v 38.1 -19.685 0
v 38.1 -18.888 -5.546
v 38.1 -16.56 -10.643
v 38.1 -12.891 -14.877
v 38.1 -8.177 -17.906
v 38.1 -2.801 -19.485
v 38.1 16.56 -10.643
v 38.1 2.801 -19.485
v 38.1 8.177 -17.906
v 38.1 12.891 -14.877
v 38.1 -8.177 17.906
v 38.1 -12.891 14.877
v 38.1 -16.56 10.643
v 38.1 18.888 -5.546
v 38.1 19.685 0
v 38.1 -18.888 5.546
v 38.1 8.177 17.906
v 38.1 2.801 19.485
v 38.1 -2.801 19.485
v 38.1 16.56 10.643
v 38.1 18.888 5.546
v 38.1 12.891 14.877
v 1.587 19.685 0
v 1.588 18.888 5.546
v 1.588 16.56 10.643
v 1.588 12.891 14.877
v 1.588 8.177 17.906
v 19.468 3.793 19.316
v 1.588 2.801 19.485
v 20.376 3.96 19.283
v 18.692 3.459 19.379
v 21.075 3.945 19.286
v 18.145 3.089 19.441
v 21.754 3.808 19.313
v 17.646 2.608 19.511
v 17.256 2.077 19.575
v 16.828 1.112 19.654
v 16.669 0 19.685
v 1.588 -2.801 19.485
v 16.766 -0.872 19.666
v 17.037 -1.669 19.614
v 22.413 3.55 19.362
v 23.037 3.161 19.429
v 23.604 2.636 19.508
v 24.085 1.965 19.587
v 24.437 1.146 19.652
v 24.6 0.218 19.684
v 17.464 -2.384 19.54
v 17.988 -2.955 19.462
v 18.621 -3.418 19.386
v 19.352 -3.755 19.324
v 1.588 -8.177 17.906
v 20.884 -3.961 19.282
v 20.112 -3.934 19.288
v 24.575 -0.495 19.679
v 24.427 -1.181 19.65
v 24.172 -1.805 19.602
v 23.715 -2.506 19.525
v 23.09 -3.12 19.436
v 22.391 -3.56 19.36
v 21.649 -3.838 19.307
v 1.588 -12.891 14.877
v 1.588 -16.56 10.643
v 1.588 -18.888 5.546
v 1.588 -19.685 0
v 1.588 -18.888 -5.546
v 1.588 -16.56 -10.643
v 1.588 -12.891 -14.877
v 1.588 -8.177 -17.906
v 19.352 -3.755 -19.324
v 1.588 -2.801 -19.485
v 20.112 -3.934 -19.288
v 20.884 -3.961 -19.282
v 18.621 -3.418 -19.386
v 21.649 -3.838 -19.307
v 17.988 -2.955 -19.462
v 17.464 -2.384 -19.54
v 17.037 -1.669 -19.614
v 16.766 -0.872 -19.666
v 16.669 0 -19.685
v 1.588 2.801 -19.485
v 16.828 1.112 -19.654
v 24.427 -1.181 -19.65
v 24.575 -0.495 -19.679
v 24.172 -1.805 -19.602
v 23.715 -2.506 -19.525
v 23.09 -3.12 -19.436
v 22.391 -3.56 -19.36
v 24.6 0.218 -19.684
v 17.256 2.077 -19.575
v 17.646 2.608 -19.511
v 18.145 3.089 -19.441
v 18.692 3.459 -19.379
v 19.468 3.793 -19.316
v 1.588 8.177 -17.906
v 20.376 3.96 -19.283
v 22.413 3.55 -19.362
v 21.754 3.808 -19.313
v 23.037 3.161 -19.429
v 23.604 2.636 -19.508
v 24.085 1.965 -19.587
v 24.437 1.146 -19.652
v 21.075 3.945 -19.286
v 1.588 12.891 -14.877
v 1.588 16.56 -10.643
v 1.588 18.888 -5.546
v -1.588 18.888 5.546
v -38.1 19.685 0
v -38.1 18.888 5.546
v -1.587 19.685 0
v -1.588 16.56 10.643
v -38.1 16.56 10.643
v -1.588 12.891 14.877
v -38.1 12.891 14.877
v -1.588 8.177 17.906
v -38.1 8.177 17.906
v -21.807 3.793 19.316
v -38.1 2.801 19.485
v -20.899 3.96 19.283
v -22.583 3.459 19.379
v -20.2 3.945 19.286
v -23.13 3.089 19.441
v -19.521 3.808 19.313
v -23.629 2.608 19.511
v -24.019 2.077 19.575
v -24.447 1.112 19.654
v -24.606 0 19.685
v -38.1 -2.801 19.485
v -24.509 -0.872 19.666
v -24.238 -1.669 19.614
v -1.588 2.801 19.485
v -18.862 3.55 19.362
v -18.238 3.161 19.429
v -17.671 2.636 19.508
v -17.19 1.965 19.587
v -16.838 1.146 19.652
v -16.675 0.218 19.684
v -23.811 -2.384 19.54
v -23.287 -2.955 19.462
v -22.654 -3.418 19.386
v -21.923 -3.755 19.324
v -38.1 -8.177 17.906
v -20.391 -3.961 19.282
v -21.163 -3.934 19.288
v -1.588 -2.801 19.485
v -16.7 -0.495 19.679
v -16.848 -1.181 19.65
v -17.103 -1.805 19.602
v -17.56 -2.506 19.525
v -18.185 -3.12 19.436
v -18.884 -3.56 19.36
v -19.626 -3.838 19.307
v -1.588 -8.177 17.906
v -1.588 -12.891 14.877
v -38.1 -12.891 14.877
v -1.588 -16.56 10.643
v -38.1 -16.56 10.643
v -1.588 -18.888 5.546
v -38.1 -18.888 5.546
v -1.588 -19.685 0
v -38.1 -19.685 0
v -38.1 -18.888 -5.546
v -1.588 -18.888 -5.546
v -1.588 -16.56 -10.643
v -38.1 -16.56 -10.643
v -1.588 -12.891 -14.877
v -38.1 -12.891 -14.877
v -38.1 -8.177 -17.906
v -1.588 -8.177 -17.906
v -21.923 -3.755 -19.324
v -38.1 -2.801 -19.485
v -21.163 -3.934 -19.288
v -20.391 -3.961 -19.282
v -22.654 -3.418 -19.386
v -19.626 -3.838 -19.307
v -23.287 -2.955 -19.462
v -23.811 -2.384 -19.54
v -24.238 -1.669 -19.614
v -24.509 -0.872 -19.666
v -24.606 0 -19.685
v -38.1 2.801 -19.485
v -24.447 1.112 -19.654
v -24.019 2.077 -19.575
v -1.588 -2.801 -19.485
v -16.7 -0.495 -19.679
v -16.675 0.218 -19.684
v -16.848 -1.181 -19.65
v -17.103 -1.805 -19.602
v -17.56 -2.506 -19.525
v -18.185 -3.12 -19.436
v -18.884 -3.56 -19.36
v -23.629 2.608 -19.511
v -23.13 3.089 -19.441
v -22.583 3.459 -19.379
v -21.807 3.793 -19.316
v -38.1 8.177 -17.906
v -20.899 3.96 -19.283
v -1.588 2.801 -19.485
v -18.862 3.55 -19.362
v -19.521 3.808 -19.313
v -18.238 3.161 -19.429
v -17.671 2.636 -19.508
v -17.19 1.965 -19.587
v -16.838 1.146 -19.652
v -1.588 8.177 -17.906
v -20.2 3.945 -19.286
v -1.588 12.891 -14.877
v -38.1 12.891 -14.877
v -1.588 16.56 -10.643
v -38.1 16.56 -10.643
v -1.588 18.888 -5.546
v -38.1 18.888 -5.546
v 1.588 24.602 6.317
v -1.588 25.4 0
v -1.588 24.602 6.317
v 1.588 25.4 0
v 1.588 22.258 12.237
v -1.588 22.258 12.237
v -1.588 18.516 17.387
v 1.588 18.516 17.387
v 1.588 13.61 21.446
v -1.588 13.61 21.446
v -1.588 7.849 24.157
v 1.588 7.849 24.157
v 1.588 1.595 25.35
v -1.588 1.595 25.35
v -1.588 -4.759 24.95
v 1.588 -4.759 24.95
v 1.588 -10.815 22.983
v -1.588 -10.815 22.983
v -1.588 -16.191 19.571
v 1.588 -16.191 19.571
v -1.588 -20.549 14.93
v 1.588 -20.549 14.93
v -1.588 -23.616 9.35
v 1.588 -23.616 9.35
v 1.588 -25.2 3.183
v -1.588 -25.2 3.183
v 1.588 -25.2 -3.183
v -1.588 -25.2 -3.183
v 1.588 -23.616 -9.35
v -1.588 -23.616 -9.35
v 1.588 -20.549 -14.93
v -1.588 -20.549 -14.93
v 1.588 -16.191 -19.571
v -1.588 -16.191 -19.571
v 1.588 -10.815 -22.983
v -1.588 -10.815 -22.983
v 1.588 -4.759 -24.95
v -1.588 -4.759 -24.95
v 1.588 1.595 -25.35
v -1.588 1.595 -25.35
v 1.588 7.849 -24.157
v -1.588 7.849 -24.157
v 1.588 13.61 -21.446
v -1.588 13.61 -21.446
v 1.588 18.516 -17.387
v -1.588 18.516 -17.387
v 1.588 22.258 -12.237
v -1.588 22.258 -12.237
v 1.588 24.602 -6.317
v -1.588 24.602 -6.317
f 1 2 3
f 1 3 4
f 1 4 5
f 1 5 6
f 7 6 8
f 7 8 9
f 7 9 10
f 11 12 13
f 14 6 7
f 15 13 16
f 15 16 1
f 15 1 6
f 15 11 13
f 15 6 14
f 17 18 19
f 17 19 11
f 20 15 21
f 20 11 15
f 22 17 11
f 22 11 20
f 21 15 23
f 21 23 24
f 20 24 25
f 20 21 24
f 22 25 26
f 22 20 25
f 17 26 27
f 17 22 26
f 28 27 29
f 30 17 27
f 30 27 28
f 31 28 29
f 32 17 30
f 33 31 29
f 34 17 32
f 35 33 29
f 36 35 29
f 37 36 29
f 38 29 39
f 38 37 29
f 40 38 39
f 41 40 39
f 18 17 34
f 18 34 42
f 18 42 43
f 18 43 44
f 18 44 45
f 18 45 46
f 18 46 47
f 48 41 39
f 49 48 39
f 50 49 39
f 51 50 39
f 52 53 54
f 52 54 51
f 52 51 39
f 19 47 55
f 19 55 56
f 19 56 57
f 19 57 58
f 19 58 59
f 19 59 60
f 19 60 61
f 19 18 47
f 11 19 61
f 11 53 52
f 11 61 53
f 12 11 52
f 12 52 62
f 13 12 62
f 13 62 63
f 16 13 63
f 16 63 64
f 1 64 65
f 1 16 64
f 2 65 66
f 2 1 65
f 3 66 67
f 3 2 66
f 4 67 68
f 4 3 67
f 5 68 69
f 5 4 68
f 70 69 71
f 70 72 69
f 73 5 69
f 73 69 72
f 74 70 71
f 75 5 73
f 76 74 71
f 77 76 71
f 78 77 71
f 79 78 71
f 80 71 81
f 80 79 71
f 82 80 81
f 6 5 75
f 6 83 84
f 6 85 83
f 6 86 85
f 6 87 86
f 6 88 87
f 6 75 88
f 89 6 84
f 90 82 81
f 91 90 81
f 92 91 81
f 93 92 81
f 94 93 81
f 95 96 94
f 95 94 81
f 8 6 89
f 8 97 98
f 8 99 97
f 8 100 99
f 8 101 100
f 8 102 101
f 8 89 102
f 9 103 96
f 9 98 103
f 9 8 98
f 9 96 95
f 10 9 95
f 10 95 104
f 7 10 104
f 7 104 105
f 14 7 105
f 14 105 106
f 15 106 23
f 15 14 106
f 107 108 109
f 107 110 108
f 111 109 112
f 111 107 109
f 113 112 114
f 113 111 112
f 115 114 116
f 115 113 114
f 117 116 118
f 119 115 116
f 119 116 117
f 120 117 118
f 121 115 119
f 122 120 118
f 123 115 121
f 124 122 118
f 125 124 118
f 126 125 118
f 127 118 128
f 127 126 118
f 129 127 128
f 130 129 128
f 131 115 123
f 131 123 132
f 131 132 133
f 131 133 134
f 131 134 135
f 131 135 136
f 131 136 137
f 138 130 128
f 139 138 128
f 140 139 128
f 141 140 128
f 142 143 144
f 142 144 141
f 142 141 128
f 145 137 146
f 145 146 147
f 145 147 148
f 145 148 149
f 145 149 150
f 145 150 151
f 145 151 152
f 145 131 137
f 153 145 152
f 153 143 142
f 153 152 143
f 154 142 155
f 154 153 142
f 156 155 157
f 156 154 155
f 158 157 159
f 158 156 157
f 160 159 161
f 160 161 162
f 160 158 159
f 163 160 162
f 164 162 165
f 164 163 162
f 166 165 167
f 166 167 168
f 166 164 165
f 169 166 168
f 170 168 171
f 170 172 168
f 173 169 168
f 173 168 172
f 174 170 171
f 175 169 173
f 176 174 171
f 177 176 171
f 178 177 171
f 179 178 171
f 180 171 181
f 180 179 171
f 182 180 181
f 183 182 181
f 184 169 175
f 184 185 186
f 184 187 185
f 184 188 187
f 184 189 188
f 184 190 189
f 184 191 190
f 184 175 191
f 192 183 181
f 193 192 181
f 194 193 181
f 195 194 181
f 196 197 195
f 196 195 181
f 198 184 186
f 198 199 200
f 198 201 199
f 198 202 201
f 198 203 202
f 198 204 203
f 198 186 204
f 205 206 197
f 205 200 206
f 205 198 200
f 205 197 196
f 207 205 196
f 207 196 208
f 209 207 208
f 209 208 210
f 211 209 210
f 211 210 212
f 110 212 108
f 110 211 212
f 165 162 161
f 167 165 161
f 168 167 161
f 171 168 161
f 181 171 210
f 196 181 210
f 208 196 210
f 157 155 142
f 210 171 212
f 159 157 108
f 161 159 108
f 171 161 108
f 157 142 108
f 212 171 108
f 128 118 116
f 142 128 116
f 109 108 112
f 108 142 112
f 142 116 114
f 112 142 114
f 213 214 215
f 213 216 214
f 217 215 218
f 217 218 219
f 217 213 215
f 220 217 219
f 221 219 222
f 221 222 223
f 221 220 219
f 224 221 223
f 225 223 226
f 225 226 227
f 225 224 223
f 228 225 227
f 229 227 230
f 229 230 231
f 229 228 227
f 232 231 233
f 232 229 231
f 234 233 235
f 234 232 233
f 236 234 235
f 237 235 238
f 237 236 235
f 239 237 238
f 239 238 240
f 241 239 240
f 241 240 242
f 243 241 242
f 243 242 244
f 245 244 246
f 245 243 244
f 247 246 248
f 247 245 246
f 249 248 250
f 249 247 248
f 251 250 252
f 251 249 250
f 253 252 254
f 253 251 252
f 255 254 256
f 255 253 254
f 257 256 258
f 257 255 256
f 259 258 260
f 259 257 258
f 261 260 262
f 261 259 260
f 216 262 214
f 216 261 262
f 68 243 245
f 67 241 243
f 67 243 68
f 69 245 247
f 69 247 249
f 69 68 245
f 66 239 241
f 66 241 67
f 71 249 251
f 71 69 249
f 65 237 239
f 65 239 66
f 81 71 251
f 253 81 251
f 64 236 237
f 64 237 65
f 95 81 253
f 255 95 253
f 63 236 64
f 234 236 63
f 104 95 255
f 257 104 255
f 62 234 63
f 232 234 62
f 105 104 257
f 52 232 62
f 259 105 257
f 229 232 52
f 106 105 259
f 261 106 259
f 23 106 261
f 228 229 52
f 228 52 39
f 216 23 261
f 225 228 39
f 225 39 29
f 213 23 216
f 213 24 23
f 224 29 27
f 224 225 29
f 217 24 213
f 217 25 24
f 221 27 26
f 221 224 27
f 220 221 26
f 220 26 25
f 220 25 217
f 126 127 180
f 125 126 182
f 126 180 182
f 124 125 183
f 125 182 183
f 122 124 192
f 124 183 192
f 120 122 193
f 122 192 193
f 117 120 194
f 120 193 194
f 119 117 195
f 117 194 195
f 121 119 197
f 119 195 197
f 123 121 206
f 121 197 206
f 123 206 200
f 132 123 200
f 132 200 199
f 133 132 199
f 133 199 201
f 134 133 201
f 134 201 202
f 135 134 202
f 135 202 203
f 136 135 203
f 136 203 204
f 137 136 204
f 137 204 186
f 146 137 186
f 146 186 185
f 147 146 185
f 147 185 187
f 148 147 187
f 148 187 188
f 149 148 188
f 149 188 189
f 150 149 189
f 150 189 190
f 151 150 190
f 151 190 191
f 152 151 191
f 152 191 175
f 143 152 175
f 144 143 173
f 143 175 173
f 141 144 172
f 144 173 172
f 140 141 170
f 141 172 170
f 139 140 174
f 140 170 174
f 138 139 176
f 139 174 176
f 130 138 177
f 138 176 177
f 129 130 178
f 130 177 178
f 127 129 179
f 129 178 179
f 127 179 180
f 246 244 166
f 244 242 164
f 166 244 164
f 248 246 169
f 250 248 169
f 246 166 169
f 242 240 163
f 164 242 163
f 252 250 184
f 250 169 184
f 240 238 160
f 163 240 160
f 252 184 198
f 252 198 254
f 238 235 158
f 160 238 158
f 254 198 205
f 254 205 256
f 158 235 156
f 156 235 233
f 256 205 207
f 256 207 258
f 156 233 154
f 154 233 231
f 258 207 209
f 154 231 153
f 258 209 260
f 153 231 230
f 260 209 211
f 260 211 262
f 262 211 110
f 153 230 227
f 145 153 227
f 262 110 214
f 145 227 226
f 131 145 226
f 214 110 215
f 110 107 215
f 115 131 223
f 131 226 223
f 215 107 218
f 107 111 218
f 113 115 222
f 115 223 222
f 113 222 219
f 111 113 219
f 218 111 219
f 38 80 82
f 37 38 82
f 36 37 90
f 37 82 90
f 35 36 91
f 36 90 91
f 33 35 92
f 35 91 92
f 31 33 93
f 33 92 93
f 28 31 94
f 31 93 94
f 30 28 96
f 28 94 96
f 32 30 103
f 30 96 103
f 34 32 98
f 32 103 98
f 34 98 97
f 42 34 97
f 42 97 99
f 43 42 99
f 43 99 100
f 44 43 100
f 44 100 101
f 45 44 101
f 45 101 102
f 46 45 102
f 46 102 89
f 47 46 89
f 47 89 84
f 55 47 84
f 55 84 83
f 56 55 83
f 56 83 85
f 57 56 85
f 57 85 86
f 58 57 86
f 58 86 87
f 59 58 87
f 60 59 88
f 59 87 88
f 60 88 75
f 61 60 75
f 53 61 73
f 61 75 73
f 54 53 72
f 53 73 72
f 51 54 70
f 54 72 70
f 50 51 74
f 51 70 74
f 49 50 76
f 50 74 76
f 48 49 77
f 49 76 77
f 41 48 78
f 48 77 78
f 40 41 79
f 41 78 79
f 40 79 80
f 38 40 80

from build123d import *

# Parameters (mm, degrees)
F0_R     = 19.685
F1_DEPTH = 38.1
F2_R     = 25.4
F3_DEPTH = 1.5875
F6_D     = 7.9375


with BuildPart() as f1:
    # F0 (on Right) → F1 (new body, symmetric)
    with BuildSketch(Plane.YZ):
        Circle(F0_R)
    extrude(amount=F1_DEPTH, both=True)

    # F2 (on Right) → F3 (join, symmetric)
    with BuildSketch(Plane.YZ):
        Circle(F2_R)
    extrude(amount=F3_DEPTH, both=True)

    # F6 (through all)
    with Locations(Plane.XY.offset(25.4)):
        with Locations((-20.6375, 0), (20.6375, 0)):
            Hole(F6_D / 2)


solid = f1.part
